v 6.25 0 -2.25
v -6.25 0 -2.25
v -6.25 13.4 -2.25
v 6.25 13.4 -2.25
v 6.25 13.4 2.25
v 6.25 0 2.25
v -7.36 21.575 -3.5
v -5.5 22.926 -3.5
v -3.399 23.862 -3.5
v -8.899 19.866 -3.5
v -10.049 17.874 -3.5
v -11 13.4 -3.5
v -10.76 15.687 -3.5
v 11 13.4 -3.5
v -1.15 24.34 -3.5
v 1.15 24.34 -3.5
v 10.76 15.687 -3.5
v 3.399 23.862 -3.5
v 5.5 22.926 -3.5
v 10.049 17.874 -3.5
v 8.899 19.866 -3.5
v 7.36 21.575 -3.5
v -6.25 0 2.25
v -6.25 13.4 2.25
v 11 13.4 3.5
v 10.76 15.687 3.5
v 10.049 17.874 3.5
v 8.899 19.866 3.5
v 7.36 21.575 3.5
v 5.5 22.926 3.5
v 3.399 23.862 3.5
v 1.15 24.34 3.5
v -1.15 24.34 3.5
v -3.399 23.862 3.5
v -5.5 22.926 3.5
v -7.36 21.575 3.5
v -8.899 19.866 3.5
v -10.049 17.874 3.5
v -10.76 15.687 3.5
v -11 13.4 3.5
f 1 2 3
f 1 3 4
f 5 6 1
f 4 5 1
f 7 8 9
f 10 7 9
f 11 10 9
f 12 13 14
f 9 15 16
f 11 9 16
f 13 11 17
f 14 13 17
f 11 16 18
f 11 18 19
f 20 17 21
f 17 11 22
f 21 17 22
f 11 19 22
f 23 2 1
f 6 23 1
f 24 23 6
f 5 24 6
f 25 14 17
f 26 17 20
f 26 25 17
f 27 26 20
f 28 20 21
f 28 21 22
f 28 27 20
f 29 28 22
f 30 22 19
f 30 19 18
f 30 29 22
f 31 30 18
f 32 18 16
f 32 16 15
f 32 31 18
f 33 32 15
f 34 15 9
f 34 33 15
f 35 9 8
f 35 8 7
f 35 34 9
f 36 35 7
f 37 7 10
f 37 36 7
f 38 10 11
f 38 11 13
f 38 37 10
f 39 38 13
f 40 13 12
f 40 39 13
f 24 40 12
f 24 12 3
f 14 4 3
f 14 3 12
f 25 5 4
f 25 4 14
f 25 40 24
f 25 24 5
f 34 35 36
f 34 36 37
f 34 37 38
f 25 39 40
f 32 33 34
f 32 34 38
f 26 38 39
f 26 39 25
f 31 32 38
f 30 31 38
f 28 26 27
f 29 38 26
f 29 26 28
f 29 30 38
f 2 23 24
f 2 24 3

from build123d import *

# Parameters (mm, degrees)
SKETCH1_W           = 12.5
SKETCH1_H           = 4.5
BOSS_EXTRUDE1_DEPTH = 13.4
BOSS_EXTRUDE2_DEPTH = 3.5


with BuildPart() as part:
    # Sketch1 → Boss-Extrude1 (new body)
    with BuildSketch(Plane(origin=(0, 0, 0), x_dir=(1, 0, 0), z_dir=(0, 1, 0))):
        Rectangle(SKETCH1_W, SKETCH1_H)
    extrude(amount=BOSS_EXTRUDE1_DEPTH)

    # Sketch2 → Boss-Extrude2 (add, symmetric)
    with BuildSketch(Plane.XY):
        with BuildLine():
            Line((-11, 13.4), (11, 13.4))
            ThreePointArc((11, 13.4), (0, 24.4), (-11, 13.4))
        make_face()
    extrude(amount=BOSS_EXTRUDE2_DEPTH, both=True)


solid = part.part
